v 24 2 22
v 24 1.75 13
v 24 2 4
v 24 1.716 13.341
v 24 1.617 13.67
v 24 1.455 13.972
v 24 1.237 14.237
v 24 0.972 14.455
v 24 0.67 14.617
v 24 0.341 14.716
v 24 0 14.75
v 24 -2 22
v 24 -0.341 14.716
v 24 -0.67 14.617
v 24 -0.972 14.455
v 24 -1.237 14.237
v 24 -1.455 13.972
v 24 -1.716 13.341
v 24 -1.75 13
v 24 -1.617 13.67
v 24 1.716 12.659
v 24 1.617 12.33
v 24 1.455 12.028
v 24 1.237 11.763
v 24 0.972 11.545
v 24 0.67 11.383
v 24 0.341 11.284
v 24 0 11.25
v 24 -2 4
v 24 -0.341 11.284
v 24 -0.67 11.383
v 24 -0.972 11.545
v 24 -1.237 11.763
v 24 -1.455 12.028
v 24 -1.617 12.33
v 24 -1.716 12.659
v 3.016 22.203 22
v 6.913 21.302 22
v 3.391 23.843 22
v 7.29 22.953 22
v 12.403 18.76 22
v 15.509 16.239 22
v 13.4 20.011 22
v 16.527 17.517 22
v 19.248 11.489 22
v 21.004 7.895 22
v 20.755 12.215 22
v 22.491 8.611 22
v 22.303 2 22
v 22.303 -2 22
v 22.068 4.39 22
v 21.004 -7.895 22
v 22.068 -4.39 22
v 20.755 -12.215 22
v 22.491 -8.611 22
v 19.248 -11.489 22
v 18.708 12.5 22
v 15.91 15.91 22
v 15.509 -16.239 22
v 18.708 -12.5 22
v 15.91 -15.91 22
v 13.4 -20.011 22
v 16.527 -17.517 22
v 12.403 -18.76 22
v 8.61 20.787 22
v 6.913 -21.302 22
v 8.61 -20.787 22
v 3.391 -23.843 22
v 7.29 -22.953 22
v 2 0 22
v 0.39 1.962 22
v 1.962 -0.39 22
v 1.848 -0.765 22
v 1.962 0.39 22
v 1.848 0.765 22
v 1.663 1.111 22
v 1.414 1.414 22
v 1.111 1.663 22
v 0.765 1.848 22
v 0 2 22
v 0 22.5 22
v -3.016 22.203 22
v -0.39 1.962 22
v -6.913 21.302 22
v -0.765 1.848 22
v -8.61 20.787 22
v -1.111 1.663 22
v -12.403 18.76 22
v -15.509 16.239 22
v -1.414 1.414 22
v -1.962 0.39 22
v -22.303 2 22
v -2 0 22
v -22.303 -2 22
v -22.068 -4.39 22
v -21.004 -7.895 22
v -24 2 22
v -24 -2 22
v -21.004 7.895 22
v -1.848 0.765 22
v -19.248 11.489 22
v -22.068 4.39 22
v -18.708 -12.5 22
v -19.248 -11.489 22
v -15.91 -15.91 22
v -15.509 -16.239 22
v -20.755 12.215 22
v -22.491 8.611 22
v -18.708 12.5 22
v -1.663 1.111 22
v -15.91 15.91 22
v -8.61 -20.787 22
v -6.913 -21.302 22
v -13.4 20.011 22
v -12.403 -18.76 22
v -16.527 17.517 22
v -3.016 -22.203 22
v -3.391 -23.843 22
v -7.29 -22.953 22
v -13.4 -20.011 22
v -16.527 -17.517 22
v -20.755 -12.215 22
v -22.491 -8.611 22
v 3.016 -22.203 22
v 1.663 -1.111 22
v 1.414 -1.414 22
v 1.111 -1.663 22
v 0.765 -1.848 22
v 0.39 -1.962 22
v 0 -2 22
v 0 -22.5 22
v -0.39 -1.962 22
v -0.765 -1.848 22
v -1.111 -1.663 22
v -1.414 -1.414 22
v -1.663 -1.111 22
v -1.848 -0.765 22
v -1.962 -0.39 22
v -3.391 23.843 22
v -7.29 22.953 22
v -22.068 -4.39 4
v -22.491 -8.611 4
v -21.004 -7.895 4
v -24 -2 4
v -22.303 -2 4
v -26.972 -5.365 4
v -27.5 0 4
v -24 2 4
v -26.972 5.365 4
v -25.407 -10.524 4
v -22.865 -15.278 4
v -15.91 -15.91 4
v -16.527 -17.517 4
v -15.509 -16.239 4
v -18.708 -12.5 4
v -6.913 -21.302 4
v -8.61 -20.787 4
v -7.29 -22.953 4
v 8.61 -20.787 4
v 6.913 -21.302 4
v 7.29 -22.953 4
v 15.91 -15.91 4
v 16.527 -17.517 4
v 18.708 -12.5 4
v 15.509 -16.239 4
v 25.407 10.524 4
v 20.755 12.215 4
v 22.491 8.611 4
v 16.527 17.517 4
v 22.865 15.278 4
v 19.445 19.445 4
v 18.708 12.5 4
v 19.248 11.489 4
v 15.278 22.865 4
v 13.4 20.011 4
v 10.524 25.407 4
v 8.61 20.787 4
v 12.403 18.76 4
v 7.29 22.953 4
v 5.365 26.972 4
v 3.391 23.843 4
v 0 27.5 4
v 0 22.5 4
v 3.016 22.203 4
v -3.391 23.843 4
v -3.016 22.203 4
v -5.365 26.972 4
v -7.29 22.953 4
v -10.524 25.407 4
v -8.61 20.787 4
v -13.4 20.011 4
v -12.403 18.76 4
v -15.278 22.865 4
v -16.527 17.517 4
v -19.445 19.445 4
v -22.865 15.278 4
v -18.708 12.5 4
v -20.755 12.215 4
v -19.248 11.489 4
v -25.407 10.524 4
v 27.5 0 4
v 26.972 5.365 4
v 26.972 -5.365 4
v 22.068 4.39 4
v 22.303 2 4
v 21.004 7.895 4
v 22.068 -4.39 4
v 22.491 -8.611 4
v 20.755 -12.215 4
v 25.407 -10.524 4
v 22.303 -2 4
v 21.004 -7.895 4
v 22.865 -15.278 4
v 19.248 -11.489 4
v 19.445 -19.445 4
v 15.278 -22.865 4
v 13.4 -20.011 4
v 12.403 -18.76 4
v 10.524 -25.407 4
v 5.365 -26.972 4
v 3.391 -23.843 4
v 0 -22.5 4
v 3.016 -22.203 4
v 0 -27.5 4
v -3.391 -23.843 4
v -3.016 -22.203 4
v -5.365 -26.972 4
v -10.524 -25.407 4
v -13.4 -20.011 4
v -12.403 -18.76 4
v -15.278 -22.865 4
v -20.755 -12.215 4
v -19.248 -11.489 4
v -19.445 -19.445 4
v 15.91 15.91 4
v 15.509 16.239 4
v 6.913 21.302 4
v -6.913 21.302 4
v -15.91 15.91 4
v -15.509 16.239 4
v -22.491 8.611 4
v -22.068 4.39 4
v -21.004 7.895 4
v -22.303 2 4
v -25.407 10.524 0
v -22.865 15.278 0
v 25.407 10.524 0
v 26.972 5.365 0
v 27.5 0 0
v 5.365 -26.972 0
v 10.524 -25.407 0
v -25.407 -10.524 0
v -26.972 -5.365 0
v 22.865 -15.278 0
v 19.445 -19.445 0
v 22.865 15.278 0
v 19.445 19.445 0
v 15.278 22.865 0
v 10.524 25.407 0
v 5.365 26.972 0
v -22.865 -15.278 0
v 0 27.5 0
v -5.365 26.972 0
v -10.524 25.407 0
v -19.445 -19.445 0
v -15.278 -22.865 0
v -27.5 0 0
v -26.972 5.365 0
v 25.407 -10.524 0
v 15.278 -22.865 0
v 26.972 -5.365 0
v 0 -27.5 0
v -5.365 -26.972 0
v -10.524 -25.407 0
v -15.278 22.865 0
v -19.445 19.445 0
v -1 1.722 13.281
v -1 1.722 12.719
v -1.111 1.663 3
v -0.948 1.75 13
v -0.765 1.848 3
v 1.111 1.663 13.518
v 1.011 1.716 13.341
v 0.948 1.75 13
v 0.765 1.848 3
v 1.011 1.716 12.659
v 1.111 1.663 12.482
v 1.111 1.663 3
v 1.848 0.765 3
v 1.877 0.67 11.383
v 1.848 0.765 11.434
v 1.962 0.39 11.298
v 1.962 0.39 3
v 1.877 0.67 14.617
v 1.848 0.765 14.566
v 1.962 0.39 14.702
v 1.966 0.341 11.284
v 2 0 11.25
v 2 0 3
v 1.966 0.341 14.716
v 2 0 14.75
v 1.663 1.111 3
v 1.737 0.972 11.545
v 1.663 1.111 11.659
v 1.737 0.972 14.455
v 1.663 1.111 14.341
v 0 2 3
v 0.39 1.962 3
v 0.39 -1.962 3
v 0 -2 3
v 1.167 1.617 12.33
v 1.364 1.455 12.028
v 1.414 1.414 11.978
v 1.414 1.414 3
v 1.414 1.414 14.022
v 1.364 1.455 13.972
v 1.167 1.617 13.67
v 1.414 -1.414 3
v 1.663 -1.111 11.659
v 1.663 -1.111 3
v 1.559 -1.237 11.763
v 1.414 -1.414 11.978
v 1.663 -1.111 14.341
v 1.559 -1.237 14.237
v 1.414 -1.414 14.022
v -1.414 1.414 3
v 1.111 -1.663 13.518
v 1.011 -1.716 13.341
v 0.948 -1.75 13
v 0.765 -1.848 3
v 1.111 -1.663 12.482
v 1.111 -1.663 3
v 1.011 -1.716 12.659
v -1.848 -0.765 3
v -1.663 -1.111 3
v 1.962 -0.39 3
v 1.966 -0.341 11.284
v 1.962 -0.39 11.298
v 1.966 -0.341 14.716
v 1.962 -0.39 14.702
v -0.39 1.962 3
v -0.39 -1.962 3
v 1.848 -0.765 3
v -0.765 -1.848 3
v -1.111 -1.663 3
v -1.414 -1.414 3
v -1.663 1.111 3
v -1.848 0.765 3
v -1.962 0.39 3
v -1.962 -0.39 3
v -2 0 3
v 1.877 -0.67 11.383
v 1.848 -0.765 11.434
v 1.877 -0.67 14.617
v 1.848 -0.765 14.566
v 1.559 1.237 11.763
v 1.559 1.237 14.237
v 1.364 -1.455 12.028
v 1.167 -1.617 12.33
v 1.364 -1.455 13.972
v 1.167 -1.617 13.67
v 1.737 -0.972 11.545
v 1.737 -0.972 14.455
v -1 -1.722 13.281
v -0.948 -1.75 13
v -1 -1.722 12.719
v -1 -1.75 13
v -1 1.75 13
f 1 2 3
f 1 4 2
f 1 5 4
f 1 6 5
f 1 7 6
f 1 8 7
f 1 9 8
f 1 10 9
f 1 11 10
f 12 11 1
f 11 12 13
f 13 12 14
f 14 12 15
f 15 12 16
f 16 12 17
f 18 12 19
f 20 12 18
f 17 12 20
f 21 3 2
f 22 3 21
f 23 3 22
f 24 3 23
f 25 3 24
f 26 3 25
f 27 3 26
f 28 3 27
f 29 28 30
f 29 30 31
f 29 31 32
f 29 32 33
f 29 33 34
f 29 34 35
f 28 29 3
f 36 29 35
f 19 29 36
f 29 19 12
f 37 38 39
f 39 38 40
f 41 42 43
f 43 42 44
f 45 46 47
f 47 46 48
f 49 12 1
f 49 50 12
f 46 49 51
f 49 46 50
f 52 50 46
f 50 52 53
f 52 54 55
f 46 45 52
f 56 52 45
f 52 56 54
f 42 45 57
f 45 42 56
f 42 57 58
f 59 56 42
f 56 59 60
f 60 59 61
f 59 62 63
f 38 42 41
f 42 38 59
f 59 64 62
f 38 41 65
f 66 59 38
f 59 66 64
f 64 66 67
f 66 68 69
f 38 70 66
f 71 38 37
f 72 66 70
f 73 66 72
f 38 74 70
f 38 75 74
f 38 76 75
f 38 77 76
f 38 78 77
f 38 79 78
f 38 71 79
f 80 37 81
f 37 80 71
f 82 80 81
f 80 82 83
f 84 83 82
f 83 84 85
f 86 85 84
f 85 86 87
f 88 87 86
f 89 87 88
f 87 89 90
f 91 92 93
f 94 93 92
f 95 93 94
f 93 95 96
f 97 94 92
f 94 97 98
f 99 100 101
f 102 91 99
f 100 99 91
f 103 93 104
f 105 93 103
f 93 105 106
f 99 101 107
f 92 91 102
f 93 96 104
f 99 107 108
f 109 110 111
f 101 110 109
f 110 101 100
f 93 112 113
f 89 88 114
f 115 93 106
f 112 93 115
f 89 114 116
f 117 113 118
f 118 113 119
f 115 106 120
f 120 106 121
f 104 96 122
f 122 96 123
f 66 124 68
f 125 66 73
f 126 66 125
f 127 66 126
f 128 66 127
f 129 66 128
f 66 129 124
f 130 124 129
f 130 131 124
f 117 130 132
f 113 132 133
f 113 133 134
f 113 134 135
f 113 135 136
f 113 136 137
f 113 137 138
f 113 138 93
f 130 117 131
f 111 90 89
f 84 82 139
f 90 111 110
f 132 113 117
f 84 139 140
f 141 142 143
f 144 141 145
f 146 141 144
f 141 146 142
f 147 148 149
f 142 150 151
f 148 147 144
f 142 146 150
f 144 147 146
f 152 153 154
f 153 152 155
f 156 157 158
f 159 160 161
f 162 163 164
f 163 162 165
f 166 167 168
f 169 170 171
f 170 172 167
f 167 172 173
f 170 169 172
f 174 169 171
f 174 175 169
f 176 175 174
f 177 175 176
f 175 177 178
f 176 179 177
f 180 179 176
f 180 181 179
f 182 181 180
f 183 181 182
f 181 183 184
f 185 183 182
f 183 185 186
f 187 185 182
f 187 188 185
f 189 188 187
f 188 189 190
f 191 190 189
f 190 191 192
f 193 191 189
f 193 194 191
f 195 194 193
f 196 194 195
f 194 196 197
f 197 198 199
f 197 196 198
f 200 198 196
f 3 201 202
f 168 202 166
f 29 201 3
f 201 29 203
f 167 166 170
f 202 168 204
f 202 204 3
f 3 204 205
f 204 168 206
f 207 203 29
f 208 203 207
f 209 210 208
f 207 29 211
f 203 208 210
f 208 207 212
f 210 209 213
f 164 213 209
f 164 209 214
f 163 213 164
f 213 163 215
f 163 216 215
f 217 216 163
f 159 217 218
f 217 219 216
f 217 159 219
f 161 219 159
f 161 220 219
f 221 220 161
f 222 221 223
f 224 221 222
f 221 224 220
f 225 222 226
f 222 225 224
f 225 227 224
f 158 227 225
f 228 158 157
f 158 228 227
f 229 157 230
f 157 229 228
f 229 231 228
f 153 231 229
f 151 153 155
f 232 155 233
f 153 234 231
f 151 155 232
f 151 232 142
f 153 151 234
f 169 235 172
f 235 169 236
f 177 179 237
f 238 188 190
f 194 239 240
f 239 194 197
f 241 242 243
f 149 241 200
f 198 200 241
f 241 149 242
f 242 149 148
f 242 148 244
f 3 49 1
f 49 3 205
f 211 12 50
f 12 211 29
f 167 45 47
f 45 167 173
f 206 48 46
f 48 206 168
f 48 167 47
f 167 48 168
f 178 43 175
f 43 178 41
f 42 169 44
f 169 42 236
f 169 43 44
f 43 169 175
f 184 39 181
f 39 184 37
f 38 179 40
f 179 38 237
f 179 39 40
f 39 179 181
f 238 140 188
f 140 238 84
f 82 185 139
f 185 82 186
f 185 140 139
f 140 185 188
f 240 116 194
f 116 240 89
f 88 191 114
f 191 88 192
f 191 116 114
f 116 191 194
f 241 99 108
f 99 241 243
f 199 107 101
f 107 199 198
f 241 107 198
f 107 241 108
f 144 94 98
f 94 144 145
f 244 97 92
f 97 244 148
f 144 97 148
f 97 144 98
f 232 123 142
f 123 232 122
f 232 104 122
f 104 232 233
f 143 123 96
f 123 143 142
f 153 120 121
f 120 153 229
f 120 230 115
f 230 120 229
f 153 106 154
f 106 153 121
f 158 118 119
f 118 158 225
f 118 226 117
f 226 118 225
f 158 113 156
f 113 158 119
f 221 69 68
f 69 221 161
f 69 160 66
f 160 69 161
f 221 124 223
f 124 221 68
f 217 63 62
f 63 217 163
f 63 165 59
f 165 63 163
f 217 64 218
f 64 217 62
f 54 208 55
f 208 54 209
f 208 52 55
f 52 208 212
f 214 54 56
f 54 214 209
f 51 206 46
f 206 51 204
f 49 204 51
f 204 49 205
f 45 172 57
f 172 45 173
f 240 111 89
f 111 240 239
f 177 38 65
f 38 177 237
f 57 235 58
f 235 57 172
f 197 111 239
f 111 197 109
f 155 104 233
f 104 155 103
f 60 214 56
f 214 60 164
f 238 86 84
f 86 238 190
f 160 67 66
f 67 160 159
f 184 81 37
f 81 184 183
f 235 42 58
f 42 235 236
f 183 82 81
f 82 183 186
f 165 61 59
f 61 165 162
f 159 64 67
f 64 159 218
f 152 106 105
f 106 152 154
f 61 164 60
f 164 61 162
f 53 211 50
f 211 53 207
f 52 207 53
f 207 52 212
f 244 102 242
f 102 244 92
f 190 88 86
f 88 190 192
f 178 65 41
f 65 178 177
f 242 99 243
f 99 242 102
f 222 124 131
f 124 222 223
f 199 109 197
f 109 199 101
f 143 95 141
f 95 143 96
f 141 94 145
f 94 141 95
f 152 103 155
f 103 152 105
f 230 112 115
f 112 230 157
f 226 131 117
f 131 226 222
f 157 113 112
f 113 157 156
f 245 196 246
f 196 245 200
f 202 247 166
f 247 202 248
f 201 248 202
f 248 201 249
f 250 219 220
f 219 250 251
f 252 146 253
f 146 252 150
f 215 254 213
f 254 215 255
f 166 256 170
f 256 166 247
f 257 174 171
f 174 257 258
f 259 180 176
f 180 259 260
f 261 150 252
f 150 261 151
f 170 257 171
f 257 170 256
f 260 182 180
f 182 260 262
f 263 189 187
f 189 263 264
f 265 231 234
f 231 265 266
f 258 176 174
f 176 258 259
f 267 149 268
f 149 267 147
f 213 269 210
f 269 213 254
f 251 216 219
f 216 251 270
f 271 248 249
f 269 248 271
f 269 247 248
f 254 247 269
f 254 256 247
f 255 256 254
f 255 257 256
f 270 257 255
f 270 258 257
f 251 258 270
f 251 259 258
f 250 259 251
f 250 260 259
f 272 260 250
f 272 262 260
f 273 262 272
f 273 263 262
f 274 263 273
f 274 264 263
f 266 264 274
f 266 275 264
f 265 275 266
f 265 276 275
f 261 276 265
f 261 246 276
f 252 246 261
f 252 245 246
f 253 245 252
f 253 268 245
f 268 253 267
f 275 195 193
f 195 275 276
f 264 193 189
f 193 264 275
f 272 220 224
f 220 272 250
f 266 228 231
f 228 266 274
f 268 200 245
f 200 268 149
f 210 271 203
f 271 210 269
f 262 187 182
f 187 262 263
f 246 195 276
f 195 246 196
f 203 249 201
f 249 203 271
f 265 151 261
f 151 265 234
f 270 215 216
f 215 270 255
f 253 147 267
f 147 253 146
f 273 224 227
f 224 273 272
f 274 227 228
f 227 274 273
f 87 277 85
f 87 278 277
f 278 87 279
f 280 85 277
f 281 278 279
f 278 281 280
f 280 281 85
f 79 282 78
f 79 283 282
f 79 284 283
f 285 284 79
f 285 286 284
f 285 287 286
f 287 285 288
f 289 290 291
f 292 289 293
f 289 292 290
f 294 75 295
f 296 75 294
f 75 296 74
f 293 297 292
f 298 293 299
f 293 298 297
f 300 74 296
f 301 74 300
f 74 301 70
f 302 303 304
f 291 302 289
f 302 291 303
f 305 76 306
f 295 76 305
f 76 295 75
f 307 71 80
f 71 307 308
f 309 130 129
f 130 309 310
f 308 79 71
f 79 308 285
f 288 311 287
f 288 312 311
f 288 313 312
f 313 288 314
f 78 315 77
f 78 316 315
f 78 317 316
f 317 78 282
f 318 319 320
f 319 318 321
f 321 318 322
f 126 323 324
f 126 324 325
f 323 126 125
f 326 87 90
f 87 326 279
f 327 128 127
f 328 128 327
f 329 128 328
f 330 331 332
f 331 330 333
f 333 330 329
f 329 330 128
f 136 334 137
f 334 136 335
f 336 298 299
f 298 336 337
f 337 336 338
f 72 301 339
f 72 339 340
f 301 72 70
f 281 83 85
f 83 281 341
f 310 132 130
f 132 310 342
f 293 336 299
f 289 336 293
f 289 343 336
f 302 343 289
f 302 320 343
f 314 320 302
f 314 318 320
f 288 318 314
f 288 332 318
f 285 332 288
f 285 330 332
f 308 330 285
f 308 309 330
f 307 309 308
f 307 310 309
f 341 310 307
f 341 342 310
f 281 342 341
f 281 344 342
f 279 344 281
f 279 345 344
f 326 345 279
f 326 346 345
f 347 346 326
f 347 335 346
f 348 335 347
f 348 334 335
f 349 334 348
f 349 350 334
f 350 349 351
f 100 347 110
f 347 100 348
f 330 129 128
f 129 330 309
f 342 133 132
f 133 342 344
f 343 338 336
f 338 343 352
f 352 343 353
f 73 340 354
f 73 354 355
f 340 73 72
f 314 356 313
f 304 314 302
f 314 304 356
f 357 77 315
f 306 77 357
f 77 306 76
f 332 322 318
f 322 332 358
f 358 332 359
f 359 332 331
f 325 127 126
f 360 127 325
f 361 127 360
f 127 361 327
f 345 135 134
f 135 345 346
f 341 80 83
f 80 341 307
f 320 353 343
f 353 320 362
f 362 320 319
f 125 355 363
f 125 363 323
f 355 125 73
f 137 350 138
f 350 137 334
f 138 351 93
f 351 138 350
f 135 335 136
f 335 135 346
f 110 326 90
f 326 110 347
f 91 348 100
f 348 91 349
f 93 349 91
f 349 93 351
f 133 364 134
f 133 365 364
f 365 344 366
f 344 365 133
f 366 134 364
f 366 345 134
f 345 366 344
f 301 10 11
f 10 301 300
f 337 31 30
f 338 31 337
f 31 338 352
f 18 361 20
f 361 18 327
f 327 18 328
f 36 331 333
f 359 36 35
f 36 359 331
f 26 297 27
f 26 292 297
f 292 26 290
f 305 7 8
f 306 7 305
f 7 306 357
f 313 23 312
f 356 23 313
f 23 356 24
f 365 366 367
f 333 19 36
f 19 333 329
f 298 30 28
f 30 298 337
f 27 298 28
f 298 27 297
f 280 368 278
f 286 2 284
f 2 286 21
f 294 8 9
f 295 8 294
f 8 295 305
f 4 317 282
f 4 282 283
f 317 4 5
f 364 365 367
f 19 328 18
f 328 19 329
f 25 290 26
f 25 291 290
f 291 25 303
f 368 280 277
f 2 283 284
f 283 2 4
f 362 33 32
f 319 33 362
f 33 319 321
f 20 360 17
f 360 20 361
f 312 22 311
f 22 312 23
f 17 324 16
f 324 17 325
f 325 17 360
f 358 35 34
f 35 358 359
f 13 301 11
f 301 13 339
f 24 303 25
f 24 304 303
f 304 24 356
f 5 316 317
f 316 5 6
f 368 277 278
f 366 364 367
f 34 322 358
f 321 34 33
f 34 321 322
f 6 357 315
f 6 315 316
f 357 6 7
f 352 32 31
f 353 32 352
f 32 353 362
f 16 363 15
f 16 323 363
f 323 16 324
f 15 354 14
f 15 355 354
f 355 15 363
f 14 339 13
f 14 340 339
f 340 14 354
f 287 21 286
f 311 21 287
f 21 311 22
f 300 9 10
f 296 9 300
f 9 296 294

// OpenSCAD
$fn = 32;

// ----------------------------------------------------------------------
// Control knob: skirt knob with grip ribs
// ----------------------------------------------------------------------

// --- parameters (mm) ---
skirt_d = 55;             // skirt diameter
skirt_t = 4;              // skirt thickness
rib_w = 4;                // grip rib width
rib_out = 2.5;            // grip rib radial protrusion
n_ribs = 14;              // number of grip ribs
knob_d = 45;              // knob body diameter
knob_h = 18;              // knob body height
bore_d = 4;               // shaft bore diameter
set_d = 3.5;              // set screw bore diameter

rib_step = 360 / n_ribs;  // rib angular step
total_h = skirt_t + knob_h;  // overall height

difference() {
  union() {
    translate([0, 0, skirt_t]) cylinder(h = knob_h, d = knob_d);
    cylinder(h = skirt_t, d = skirt_d);
    for (i = [0 : n_ribs - 1])
      rotate([0, 0, i * rib_step])
        translate([knob_d / 2 - 1, -rib_w / 2, skirt_t])
          cube([rib_out, rib_w, knob_h]);
  }
  translate([0, 0, skirt_t - 1]) cylinder(h = knob_h + 2, d = bore_d);
  translate([-1, 0, skirt_t + knob_h / 2]) rotate([0, 90, 0])
    cylinder(h = knob_d / 2 + bore_d / 2 + 2, d = set_d);
}
